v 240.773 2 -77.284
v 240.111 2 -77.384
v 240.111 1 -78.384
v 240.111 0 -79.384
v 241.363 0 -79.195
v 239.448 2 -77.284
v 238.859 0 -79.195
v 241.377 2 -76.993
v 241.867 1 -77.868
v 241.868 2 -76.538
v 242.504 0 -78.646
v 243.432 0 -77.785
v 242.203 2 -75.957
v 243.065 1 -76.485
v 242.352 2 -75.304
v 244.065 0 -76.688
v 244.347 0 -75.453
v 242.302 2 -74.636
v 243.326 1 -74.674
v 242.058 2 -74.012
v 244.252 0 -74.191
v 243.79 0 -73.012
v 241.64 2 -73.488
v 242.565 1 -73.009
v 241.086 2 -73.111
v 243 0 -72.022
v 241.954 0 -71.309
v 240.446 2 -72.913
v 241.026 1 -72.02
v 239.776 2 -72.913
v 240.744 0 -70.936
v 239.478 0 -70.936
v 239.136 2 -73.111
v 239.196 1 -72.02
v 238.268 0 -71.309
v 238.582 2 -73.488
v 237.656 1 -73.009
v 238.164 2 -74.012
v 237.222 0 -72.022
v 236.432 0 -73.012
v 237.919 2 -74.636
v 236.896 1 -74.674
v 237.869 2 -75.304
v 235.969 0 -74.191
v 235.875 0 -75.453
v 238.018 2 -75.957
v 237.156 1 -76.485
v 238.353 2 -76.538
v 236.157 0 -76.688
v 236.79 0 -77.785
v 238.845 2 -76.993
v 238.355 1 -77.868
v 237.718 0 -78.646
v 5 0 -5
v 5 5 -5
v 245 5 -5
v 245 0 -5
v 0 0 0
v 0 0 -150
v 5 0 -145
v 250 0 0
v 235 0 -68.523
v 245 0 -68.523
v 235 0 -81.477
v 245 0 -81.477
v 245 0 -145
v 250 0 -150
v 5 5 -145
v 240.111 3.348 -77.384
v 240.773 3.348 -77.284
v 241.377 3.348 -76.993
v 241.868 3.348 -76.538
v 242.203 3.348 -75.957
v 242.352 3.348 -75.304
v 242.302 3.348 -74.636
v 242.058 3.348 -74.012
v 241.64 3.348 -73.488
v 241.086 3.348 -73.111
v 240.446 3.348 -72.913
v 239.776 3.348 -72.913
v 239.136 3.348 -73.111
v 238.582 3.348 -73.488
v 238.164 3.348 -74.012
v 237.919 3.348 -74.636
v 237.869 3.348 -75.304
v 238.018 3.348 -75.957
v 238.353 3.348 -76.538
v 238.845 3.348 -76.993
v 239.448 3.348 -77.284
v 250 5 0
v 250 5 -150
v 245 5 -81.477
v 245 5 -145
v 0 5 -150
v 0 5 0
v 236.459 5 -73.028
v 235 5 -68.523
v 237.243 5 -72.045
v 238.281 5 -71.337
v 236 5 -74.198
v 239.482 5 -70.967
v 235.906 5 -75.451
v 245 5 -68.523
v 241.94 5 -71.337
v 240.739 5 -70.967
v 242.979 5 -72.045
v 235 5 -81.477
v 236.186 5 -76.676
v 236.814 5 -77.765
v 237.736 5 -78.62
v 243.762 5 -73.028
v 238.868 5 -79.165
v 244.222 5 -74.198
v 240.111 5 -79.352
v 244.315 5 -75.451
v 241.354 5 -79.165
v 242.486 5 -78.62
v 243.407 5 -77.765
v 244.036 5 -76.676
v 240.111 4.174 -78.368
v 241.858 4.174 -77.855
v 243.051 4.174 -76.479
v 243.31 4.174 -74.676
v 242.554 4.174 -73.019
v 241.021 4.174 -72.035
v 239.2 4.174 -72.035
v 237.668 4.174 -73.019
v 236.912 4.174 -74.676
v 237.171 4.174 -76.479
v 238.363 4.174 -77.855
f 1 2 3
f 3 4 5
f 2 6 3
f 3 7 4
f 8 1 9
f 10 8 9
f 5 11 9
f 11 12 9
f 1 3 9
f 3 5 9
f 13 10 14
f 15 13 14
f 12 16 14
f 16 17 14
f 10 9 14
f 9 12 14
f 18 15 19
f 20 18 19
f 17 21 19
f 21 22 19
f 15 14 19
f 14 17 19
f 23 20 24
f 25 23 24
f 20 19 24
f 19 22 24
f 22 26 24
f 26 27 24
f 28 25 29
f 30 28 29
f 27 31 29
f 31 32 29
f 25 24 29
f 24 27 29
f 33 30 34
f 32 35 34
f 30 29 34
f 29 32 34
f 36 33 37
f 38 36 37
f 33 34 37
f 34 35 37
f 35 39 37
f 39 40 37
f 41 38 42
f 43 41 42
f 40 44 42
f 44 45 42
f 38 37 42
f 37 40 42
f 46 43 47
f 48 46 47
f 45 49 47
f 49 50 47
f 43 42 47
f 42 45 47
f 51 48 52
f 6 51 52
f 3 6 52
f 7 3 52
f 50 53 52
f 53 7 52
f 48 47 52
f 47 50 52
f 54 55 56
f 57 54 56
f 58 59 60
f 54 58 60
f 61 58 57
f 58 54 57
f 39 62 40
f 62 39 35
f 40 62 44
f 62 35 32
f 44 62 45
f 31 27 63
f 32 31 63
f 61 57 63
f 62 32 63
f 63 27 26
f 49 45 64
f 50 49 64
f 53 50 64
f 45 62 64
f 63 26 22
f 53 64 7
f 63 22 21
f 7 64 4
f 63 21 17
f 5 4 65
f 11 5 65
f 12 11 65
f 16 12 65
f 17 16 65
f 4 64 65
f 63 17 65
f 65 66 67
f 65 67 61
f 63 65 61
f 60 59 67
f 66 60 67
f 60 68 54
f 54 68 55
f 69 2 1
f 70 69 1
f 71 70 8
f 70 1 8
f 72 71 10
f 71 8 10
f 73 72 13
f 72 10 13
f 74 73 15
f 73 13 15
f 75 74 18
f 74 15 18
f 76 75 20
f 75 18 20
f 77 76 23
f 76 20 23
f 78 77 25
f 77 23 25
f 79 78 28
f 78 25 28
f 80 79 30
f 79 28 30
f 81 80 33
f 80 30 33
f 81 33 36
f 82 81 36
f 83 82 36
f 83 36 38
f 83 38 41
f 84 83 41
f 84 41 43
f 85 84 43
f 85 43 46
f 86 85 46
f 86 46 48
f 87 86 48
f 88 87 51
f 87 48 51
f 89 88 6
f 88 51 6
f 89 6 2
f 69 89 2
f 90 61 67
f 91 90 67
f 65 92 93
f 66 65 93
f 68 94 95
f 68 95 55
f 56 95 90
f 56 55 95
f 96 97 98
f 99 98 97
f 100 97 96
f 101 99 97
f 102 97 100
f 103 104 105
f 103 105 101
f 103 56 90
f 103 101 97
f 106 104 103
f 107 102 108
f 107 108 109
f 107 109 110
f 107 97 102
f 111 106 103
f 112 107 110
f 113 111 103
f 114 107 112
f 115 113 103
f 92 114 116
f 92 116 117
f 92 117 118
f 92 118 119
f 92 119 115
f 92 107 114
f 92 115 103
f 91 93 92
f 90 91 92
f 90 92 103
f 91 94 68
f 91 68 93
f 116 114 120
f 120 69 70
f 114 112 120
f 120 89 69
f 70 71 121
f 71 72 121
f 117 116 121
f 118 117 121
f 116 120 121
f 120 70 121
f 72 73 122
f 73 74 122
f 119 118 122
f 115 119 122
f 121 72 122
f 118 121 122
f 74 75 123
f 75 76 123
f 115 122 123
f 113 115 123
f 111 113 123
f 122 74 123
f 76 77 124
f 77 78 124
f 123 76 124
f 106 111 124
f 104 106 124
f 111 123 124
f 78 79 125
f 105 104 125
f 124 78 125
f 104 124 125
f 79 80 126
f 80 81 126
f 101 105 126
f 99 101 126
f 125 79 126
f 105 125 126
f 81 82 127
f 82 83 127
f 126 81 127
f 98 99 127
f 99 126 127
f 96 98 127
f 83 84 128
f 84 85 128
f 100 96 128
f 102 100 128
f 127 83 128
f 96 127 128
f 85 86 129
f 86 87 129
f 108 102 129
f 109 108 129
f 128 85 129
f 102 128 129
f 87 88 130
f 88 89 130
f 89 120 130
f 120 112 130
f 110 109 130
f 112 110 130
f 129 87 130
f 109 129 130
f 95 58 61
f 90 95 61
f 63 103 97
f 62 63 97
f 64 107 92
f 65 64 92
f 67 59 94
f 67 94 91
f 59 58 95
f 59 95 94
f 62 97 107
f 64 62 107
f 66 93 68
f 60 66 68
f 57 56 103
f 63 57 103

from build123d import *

# Parameters (mm, degrees)
SKETCH1_W                                         = 250
SKETCH1_H                                         = 150
BOSS_EXTRUDE1_DEPTH                               = 5
CUT_EXTRUDE1_DEPTH                                = 5
CSK_FOR_8_FLAT_HEAD_MACHINE_SCREW_100_D           = 4.4958
CSK_FOR_8_FLAT_HEAD_MACHINE_SCREW_100_CSINK_D     = 8.4328
CSK_FOR_8_FLAT_HEAD_MACHINE_SCREW_100_CSINK_ANGLE = 100
CHAMFER1_SIZE                                     = 2


with BuildPart() as part:
    # Sketch1 → Boss-Extrude1 (new body)
    with BuildSketch(Plane(origin=(0, 0, 0), x_dir=(1, 0, 0), z_dir=(0, 1, 0))):
        with Locations((125, 75)):
            Rectangle(SKETCH1_W, SKETCH1_H)
    extrude(amount=BOSS_EXTRUDE1_DEPTH)

    # Sketch2 → Cut-Extrude1 (cut)
    with BuildSketch(Plane(origin=(0, 5, 0), x_dir=(1, 0, 0), z_dir=(0, 1, 0))):
        Polygon((5, 5), (245, 5), (245, 68.522708921), (235, 68.522708921), (235, 81.477291079), (245, 81.477291079), (245, 145), (5, 145), align=None)
    extrude(amount=-CUT_EXTRUDE1_DEPTH, mode=Mode.SUBTRACT)

    # CSK for #8 Flat Head Machine Screw (100)1 (through all)
    with Locations(Plane(origin=(240.110859841, 5, -75.135992341), x_dir=(0, 0, 1), z_dir=(0, 1, 0))):
        with Locations((0, 0)):
            CounterSinkHole(CSK_FOR_8_FLAT_HEAD_MACHINE_SCREW_100_D / 2, CSK_FOR_8_FLAT_HEAD_MACHINE_SCREW_100_CSINK_D / 2, counter_sink_angle=CSK_FOR_8_FLAT_HEAD_MACHINE_SCREW_100_CSINK_ANGLE)

    # Chamfer1
    chamfer1_edges = [part.edges().sort_by_distance(p)[0] for p in [
        (240.110859841, 0, -72.888092341),
    ]]
    chamfer(chamfer1_edges, length=CHAMFER1_SIZE)


solid = part.part
